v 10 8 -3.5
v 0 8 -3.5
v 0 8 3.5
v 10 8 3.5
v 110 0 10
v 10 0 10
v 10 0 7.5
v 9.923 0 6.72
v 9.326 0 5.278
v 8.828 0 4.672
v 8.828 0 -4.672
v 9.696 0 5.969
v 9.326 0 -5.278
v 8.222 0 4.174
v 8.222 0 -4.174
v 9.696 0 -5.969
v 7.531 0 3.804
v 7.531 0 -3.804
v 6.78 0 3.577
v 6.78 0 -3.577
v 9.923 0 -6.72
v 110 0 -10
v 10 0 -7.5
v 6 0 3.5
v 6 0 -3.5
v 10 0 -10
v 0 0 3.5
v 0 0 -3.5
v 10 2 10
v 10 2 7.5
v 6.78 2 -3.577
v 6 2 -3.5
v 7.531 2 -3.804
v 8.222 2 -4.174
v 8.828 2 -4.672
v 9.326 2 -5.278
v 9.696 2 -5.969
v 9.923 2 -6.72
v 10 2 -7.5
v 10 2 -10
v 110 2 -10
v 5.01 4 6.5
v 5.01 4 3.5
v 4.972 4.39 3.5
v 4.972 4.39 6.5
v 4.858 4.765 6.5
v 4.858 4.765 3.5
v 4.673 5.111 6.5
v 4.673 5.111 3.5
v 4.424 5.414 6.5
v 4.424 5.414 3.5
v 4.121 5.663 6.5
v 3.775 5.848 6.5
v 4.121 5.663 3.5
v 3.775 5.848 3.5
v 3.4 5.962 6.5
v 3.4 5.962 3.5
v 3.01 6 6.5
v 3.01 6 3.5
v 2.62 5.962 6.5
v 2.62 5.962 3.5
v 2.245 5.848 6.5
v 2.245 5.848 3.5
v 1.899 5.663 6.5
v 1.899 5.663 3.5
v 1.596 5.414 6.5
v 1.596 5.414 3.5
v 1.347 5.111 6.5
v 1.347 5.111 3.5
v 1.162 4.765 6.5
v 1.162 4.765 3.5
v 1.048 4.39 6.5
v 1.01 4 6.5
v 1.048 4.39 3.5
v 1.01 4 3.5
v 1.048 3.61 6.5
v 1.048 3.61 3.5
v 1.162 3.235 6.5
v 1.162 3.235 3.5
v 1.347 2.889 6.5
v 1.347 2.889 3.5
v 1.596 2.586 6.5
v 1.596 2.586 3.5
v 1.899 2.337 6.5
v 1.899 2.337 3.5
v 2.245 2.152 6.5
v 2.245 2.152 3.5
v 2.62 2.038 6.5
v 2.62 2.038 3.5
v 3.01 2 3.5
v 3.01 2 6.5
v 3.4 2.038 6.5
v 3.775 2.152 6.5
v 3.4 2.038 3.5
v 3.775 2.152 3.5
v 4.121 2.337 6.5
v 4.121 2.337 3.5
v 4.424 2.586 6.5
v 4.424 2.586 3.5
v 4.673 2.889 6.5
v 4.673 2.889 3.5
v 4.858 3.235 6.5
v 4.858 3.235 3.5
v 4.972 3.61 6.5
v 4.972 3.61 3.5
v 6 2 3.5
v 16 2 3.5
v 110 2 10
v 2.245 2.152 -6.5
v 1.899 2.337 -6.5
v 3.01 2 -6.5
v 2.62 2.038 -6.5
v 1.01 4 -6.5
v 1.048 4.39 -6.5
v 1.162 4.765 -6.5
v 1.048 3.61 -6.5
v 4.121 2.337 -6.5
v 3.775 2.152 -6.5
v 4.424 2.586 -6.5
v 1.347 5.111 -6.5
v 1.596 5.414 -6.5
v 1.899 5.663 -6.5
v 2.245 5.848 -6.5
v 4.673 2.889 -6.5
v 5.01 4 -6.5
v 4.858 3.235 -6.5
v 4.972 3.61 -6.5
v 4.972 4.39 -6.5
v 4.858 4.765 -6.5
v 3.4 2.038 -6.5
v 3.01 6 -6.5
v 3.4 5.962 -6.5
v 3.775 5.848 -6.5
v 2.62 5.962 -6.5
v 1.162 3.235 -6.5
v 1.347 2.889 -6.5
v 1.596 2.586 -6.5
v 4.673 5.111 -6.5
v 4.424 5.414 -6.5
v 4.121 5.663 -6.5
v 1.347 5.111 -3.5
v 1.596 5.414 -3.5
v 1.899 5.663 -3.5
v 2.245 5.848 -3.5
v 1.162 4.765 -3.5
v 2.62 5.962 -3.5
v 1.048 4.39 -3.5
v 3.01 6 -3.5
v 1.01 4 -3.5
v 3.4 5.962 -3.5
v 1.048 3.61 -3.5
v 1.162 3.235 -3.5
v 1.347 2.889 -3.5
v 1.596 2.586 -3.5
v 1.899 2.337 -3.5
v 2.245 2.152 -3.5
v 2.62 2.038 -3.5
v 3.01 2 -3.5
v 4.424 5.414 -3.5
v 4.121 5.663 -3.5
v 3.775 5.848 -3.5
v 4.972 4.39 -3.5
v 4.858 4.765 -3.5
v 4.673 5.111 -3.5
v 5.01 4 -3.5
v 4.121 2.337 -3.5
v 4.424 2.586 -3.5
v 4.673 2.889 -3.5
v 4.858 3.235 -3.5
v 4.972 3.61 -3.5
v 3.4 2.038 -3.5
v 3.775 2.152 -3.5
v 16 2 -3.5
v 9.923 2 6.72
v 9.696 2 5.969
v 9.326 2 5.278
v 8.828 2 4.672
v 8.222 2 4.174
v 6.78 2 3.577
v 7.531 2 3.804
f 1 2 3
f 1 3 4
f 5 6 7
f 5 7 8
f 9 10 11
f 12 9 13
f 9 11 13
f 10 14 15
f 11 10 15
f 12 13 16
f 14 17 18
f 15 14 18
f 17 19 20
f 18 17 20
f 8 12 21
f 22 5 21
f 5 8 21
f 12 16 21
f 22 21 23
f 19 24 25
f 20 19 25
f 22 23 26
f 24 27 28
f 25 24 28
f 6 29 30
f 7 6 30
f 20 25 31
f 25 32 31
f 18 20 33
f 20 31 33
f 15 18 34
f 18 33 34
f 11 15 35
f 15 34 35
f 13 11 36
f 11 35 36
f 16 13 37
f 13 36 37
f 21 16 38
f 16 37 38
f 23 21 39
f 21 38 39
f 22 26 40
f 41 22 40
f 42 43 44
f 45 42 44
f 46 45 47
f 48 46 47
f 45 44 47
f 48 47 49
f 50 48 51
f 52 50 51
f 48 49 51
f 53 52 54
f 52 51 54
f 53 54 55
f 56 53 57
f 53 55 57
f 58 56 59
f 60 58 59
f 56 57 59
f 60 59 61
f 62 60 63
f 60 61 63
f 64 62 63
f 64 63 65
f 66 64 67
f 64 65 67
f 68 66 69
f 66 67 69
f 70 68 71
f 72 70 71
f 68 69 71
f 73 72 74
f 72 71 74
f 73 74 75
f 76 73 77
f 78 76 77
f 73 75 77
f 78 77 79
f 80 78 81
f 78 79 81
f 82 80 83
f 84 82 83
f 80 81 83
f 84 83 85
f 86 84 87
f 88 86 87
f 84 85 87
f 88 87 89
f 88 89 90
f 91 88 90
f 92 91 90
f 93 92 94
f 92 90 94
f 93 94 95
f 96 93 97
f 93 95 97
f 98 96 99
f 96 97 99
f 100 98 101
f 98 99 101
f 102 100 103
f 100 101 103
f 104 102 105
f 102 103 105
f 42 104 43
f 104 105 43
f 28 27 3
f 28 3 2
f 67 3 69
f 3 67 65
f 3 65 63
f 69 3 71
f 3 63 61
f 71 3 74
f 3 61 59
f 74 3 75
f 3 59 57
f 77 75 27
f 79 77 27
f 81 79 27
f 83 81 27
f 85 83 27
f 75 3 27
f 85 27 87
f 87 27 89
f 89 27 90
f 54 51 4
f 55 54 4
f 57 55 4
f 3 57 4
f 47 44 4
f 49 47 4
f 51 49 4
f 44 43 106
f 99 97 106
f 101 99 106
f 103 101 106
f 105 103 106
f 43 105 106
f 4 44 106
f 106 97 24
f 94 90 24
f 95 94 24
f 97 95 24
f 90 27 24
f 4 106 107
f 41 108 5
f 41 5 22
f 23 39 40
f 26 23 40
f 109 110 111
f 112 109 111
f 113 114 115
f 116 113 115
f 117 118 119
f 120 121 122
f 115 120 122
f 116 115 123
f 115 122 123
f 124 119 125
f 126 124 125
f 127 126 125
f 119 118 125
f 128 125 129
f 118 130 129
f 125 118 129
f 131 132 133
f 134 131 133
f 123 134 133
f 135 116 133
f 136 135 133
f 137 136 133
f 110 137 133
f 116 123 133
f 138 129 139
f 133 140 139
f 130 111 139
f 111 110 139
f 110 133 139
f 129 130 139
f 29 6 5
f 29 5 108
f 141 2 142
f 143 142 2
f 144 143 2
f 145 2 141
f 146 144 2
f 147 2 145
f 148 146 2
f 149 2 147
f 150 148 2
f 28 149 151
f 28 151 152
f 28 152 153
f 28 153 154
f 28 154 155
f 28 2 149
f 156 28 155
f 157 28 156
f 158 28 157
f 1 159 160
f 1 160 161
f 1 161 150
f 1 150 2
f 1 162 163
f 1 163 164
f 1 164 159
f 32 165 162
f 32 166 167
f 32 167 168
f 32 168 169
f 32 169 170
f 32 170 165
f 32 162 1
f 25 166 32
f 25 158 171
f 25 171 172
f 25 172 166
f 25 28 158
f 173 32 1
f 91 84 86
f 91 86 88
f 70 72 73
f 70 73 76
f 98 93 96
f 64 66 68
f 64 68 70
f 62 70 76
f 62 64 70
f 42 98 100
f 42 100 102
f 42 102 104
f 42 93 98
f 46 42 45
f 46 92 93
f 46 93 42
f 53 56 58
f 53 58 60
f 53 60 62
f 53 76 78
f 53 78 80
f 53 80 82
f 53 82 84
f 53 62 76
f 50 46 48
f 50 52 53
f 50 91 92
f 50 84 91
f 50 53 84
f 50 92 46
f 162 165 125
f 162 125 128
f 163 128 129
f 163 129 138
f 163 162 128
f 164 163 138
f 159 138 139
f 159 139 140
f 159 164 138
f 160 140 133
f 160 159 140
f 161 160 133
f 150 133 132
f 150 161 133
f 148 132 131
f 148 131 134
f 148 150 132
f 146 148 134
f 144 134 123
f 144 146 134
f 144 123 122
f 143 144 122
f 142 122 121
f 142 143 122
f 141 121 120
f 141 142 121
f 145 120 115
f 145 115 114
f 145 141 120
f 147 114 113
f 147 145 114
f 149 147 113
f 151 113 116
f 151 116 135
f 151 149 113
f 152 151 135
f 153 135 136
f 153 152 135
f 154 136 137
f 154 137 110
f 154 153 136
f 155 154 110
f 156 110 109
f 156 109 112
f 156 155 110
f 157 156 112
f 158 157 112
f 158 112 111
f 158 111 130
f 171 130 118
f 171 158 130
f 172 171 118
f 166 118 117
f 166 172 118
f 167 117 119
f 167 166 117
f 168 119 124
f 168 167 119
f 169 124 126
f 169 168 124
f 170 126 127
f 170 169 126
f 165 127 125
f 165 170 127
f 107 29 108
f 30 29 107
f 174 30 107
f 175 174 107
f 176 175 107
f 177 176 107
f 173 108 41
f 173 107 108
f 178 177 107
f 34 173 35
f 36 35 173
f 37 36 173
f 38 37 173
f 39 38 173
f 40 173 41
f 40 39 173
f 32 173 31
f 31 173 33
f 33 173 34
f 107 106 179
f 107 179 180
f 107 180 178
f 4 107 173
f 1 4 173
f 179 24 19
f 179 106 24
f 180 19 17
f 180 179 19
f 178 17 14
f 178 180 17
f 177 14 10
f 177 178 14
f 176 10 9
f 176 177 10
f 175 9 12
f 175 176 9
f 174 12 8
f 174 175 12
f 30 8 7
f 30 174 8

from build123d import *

# Parameters (mm, degrees)
SKETCH2_W           = 10
SKETCH2_H           = 7
BOSS_EXTRUDE1_DEPTH = 8
SKETCH3_R           = 2
BOSS_EXTRUDE2_DEPTH = 3
SKETCH4_W           = 20
SKETCH4_H           = 2
BOSS_EXTRUDE3_DEPTH = 100
CHAMFER1_SIZE       = 6
FILLET1_R           = 4


with BuildPart() as part:
    # Sketch2 → Boss-Extrude1 (new body)
    with BuildSketch(Plane(origin=(0, 0, 0), x_dir=(1, 0, 0), z_dir=(0, 1, 0))):
        with Locations((5, 0)):
            Rectangle(SKETCH2_W, SKETCH2_H)
    extrude(amount=BOSS_EXTRUDE1_DEPTH)

    # Sketch3 → Boss-Extrude2 (add)
    with BuildSketch(Plane.XY.offset(3.5)):
        with Locations((3.01, 4)):
            Circle(SKETCH3_R)
    boss_extrude2 = extrude(amount=BOSS_EXTRUDE2_DEPTH)

    # Mirror1: Boss-Extrude2 across plane
    add(boss_extrude2.mirror(Plane.XY))

    # Sketch4 → Boss-Extrude3 (add)
    with BuildSketch(Plane(origin=(10, 0, 0), x_dir=(0, 0, -1), z_dir=(1, 0, 0))):
        with Locations((0, 1)):
            Rectangle(SKETCH4_W, SKETCH4_H)
    extrude(amount=BOSS_EXTRUDE3_DEPTH)

    # Chamfer1
    chamfer1_edges = [part.edges().sort_by_distance(p)[0] for p in [
        (10, 2, 0),
    ]]
    chamfer(chamfer1_edges, length=CHAMFER1_SIZE - 0.0001)  # a hair under: the kernel refuses the full size

    # Fillet1
    fillet1_edges = [part.edges().sort_by_distance(p)[0] for p in [
        (10, 1, -3.5),
        (10, 1, 3.5),
    ]]
    fillet(fillet1_edges, radius=FILLET1_R)


solid = part.part
